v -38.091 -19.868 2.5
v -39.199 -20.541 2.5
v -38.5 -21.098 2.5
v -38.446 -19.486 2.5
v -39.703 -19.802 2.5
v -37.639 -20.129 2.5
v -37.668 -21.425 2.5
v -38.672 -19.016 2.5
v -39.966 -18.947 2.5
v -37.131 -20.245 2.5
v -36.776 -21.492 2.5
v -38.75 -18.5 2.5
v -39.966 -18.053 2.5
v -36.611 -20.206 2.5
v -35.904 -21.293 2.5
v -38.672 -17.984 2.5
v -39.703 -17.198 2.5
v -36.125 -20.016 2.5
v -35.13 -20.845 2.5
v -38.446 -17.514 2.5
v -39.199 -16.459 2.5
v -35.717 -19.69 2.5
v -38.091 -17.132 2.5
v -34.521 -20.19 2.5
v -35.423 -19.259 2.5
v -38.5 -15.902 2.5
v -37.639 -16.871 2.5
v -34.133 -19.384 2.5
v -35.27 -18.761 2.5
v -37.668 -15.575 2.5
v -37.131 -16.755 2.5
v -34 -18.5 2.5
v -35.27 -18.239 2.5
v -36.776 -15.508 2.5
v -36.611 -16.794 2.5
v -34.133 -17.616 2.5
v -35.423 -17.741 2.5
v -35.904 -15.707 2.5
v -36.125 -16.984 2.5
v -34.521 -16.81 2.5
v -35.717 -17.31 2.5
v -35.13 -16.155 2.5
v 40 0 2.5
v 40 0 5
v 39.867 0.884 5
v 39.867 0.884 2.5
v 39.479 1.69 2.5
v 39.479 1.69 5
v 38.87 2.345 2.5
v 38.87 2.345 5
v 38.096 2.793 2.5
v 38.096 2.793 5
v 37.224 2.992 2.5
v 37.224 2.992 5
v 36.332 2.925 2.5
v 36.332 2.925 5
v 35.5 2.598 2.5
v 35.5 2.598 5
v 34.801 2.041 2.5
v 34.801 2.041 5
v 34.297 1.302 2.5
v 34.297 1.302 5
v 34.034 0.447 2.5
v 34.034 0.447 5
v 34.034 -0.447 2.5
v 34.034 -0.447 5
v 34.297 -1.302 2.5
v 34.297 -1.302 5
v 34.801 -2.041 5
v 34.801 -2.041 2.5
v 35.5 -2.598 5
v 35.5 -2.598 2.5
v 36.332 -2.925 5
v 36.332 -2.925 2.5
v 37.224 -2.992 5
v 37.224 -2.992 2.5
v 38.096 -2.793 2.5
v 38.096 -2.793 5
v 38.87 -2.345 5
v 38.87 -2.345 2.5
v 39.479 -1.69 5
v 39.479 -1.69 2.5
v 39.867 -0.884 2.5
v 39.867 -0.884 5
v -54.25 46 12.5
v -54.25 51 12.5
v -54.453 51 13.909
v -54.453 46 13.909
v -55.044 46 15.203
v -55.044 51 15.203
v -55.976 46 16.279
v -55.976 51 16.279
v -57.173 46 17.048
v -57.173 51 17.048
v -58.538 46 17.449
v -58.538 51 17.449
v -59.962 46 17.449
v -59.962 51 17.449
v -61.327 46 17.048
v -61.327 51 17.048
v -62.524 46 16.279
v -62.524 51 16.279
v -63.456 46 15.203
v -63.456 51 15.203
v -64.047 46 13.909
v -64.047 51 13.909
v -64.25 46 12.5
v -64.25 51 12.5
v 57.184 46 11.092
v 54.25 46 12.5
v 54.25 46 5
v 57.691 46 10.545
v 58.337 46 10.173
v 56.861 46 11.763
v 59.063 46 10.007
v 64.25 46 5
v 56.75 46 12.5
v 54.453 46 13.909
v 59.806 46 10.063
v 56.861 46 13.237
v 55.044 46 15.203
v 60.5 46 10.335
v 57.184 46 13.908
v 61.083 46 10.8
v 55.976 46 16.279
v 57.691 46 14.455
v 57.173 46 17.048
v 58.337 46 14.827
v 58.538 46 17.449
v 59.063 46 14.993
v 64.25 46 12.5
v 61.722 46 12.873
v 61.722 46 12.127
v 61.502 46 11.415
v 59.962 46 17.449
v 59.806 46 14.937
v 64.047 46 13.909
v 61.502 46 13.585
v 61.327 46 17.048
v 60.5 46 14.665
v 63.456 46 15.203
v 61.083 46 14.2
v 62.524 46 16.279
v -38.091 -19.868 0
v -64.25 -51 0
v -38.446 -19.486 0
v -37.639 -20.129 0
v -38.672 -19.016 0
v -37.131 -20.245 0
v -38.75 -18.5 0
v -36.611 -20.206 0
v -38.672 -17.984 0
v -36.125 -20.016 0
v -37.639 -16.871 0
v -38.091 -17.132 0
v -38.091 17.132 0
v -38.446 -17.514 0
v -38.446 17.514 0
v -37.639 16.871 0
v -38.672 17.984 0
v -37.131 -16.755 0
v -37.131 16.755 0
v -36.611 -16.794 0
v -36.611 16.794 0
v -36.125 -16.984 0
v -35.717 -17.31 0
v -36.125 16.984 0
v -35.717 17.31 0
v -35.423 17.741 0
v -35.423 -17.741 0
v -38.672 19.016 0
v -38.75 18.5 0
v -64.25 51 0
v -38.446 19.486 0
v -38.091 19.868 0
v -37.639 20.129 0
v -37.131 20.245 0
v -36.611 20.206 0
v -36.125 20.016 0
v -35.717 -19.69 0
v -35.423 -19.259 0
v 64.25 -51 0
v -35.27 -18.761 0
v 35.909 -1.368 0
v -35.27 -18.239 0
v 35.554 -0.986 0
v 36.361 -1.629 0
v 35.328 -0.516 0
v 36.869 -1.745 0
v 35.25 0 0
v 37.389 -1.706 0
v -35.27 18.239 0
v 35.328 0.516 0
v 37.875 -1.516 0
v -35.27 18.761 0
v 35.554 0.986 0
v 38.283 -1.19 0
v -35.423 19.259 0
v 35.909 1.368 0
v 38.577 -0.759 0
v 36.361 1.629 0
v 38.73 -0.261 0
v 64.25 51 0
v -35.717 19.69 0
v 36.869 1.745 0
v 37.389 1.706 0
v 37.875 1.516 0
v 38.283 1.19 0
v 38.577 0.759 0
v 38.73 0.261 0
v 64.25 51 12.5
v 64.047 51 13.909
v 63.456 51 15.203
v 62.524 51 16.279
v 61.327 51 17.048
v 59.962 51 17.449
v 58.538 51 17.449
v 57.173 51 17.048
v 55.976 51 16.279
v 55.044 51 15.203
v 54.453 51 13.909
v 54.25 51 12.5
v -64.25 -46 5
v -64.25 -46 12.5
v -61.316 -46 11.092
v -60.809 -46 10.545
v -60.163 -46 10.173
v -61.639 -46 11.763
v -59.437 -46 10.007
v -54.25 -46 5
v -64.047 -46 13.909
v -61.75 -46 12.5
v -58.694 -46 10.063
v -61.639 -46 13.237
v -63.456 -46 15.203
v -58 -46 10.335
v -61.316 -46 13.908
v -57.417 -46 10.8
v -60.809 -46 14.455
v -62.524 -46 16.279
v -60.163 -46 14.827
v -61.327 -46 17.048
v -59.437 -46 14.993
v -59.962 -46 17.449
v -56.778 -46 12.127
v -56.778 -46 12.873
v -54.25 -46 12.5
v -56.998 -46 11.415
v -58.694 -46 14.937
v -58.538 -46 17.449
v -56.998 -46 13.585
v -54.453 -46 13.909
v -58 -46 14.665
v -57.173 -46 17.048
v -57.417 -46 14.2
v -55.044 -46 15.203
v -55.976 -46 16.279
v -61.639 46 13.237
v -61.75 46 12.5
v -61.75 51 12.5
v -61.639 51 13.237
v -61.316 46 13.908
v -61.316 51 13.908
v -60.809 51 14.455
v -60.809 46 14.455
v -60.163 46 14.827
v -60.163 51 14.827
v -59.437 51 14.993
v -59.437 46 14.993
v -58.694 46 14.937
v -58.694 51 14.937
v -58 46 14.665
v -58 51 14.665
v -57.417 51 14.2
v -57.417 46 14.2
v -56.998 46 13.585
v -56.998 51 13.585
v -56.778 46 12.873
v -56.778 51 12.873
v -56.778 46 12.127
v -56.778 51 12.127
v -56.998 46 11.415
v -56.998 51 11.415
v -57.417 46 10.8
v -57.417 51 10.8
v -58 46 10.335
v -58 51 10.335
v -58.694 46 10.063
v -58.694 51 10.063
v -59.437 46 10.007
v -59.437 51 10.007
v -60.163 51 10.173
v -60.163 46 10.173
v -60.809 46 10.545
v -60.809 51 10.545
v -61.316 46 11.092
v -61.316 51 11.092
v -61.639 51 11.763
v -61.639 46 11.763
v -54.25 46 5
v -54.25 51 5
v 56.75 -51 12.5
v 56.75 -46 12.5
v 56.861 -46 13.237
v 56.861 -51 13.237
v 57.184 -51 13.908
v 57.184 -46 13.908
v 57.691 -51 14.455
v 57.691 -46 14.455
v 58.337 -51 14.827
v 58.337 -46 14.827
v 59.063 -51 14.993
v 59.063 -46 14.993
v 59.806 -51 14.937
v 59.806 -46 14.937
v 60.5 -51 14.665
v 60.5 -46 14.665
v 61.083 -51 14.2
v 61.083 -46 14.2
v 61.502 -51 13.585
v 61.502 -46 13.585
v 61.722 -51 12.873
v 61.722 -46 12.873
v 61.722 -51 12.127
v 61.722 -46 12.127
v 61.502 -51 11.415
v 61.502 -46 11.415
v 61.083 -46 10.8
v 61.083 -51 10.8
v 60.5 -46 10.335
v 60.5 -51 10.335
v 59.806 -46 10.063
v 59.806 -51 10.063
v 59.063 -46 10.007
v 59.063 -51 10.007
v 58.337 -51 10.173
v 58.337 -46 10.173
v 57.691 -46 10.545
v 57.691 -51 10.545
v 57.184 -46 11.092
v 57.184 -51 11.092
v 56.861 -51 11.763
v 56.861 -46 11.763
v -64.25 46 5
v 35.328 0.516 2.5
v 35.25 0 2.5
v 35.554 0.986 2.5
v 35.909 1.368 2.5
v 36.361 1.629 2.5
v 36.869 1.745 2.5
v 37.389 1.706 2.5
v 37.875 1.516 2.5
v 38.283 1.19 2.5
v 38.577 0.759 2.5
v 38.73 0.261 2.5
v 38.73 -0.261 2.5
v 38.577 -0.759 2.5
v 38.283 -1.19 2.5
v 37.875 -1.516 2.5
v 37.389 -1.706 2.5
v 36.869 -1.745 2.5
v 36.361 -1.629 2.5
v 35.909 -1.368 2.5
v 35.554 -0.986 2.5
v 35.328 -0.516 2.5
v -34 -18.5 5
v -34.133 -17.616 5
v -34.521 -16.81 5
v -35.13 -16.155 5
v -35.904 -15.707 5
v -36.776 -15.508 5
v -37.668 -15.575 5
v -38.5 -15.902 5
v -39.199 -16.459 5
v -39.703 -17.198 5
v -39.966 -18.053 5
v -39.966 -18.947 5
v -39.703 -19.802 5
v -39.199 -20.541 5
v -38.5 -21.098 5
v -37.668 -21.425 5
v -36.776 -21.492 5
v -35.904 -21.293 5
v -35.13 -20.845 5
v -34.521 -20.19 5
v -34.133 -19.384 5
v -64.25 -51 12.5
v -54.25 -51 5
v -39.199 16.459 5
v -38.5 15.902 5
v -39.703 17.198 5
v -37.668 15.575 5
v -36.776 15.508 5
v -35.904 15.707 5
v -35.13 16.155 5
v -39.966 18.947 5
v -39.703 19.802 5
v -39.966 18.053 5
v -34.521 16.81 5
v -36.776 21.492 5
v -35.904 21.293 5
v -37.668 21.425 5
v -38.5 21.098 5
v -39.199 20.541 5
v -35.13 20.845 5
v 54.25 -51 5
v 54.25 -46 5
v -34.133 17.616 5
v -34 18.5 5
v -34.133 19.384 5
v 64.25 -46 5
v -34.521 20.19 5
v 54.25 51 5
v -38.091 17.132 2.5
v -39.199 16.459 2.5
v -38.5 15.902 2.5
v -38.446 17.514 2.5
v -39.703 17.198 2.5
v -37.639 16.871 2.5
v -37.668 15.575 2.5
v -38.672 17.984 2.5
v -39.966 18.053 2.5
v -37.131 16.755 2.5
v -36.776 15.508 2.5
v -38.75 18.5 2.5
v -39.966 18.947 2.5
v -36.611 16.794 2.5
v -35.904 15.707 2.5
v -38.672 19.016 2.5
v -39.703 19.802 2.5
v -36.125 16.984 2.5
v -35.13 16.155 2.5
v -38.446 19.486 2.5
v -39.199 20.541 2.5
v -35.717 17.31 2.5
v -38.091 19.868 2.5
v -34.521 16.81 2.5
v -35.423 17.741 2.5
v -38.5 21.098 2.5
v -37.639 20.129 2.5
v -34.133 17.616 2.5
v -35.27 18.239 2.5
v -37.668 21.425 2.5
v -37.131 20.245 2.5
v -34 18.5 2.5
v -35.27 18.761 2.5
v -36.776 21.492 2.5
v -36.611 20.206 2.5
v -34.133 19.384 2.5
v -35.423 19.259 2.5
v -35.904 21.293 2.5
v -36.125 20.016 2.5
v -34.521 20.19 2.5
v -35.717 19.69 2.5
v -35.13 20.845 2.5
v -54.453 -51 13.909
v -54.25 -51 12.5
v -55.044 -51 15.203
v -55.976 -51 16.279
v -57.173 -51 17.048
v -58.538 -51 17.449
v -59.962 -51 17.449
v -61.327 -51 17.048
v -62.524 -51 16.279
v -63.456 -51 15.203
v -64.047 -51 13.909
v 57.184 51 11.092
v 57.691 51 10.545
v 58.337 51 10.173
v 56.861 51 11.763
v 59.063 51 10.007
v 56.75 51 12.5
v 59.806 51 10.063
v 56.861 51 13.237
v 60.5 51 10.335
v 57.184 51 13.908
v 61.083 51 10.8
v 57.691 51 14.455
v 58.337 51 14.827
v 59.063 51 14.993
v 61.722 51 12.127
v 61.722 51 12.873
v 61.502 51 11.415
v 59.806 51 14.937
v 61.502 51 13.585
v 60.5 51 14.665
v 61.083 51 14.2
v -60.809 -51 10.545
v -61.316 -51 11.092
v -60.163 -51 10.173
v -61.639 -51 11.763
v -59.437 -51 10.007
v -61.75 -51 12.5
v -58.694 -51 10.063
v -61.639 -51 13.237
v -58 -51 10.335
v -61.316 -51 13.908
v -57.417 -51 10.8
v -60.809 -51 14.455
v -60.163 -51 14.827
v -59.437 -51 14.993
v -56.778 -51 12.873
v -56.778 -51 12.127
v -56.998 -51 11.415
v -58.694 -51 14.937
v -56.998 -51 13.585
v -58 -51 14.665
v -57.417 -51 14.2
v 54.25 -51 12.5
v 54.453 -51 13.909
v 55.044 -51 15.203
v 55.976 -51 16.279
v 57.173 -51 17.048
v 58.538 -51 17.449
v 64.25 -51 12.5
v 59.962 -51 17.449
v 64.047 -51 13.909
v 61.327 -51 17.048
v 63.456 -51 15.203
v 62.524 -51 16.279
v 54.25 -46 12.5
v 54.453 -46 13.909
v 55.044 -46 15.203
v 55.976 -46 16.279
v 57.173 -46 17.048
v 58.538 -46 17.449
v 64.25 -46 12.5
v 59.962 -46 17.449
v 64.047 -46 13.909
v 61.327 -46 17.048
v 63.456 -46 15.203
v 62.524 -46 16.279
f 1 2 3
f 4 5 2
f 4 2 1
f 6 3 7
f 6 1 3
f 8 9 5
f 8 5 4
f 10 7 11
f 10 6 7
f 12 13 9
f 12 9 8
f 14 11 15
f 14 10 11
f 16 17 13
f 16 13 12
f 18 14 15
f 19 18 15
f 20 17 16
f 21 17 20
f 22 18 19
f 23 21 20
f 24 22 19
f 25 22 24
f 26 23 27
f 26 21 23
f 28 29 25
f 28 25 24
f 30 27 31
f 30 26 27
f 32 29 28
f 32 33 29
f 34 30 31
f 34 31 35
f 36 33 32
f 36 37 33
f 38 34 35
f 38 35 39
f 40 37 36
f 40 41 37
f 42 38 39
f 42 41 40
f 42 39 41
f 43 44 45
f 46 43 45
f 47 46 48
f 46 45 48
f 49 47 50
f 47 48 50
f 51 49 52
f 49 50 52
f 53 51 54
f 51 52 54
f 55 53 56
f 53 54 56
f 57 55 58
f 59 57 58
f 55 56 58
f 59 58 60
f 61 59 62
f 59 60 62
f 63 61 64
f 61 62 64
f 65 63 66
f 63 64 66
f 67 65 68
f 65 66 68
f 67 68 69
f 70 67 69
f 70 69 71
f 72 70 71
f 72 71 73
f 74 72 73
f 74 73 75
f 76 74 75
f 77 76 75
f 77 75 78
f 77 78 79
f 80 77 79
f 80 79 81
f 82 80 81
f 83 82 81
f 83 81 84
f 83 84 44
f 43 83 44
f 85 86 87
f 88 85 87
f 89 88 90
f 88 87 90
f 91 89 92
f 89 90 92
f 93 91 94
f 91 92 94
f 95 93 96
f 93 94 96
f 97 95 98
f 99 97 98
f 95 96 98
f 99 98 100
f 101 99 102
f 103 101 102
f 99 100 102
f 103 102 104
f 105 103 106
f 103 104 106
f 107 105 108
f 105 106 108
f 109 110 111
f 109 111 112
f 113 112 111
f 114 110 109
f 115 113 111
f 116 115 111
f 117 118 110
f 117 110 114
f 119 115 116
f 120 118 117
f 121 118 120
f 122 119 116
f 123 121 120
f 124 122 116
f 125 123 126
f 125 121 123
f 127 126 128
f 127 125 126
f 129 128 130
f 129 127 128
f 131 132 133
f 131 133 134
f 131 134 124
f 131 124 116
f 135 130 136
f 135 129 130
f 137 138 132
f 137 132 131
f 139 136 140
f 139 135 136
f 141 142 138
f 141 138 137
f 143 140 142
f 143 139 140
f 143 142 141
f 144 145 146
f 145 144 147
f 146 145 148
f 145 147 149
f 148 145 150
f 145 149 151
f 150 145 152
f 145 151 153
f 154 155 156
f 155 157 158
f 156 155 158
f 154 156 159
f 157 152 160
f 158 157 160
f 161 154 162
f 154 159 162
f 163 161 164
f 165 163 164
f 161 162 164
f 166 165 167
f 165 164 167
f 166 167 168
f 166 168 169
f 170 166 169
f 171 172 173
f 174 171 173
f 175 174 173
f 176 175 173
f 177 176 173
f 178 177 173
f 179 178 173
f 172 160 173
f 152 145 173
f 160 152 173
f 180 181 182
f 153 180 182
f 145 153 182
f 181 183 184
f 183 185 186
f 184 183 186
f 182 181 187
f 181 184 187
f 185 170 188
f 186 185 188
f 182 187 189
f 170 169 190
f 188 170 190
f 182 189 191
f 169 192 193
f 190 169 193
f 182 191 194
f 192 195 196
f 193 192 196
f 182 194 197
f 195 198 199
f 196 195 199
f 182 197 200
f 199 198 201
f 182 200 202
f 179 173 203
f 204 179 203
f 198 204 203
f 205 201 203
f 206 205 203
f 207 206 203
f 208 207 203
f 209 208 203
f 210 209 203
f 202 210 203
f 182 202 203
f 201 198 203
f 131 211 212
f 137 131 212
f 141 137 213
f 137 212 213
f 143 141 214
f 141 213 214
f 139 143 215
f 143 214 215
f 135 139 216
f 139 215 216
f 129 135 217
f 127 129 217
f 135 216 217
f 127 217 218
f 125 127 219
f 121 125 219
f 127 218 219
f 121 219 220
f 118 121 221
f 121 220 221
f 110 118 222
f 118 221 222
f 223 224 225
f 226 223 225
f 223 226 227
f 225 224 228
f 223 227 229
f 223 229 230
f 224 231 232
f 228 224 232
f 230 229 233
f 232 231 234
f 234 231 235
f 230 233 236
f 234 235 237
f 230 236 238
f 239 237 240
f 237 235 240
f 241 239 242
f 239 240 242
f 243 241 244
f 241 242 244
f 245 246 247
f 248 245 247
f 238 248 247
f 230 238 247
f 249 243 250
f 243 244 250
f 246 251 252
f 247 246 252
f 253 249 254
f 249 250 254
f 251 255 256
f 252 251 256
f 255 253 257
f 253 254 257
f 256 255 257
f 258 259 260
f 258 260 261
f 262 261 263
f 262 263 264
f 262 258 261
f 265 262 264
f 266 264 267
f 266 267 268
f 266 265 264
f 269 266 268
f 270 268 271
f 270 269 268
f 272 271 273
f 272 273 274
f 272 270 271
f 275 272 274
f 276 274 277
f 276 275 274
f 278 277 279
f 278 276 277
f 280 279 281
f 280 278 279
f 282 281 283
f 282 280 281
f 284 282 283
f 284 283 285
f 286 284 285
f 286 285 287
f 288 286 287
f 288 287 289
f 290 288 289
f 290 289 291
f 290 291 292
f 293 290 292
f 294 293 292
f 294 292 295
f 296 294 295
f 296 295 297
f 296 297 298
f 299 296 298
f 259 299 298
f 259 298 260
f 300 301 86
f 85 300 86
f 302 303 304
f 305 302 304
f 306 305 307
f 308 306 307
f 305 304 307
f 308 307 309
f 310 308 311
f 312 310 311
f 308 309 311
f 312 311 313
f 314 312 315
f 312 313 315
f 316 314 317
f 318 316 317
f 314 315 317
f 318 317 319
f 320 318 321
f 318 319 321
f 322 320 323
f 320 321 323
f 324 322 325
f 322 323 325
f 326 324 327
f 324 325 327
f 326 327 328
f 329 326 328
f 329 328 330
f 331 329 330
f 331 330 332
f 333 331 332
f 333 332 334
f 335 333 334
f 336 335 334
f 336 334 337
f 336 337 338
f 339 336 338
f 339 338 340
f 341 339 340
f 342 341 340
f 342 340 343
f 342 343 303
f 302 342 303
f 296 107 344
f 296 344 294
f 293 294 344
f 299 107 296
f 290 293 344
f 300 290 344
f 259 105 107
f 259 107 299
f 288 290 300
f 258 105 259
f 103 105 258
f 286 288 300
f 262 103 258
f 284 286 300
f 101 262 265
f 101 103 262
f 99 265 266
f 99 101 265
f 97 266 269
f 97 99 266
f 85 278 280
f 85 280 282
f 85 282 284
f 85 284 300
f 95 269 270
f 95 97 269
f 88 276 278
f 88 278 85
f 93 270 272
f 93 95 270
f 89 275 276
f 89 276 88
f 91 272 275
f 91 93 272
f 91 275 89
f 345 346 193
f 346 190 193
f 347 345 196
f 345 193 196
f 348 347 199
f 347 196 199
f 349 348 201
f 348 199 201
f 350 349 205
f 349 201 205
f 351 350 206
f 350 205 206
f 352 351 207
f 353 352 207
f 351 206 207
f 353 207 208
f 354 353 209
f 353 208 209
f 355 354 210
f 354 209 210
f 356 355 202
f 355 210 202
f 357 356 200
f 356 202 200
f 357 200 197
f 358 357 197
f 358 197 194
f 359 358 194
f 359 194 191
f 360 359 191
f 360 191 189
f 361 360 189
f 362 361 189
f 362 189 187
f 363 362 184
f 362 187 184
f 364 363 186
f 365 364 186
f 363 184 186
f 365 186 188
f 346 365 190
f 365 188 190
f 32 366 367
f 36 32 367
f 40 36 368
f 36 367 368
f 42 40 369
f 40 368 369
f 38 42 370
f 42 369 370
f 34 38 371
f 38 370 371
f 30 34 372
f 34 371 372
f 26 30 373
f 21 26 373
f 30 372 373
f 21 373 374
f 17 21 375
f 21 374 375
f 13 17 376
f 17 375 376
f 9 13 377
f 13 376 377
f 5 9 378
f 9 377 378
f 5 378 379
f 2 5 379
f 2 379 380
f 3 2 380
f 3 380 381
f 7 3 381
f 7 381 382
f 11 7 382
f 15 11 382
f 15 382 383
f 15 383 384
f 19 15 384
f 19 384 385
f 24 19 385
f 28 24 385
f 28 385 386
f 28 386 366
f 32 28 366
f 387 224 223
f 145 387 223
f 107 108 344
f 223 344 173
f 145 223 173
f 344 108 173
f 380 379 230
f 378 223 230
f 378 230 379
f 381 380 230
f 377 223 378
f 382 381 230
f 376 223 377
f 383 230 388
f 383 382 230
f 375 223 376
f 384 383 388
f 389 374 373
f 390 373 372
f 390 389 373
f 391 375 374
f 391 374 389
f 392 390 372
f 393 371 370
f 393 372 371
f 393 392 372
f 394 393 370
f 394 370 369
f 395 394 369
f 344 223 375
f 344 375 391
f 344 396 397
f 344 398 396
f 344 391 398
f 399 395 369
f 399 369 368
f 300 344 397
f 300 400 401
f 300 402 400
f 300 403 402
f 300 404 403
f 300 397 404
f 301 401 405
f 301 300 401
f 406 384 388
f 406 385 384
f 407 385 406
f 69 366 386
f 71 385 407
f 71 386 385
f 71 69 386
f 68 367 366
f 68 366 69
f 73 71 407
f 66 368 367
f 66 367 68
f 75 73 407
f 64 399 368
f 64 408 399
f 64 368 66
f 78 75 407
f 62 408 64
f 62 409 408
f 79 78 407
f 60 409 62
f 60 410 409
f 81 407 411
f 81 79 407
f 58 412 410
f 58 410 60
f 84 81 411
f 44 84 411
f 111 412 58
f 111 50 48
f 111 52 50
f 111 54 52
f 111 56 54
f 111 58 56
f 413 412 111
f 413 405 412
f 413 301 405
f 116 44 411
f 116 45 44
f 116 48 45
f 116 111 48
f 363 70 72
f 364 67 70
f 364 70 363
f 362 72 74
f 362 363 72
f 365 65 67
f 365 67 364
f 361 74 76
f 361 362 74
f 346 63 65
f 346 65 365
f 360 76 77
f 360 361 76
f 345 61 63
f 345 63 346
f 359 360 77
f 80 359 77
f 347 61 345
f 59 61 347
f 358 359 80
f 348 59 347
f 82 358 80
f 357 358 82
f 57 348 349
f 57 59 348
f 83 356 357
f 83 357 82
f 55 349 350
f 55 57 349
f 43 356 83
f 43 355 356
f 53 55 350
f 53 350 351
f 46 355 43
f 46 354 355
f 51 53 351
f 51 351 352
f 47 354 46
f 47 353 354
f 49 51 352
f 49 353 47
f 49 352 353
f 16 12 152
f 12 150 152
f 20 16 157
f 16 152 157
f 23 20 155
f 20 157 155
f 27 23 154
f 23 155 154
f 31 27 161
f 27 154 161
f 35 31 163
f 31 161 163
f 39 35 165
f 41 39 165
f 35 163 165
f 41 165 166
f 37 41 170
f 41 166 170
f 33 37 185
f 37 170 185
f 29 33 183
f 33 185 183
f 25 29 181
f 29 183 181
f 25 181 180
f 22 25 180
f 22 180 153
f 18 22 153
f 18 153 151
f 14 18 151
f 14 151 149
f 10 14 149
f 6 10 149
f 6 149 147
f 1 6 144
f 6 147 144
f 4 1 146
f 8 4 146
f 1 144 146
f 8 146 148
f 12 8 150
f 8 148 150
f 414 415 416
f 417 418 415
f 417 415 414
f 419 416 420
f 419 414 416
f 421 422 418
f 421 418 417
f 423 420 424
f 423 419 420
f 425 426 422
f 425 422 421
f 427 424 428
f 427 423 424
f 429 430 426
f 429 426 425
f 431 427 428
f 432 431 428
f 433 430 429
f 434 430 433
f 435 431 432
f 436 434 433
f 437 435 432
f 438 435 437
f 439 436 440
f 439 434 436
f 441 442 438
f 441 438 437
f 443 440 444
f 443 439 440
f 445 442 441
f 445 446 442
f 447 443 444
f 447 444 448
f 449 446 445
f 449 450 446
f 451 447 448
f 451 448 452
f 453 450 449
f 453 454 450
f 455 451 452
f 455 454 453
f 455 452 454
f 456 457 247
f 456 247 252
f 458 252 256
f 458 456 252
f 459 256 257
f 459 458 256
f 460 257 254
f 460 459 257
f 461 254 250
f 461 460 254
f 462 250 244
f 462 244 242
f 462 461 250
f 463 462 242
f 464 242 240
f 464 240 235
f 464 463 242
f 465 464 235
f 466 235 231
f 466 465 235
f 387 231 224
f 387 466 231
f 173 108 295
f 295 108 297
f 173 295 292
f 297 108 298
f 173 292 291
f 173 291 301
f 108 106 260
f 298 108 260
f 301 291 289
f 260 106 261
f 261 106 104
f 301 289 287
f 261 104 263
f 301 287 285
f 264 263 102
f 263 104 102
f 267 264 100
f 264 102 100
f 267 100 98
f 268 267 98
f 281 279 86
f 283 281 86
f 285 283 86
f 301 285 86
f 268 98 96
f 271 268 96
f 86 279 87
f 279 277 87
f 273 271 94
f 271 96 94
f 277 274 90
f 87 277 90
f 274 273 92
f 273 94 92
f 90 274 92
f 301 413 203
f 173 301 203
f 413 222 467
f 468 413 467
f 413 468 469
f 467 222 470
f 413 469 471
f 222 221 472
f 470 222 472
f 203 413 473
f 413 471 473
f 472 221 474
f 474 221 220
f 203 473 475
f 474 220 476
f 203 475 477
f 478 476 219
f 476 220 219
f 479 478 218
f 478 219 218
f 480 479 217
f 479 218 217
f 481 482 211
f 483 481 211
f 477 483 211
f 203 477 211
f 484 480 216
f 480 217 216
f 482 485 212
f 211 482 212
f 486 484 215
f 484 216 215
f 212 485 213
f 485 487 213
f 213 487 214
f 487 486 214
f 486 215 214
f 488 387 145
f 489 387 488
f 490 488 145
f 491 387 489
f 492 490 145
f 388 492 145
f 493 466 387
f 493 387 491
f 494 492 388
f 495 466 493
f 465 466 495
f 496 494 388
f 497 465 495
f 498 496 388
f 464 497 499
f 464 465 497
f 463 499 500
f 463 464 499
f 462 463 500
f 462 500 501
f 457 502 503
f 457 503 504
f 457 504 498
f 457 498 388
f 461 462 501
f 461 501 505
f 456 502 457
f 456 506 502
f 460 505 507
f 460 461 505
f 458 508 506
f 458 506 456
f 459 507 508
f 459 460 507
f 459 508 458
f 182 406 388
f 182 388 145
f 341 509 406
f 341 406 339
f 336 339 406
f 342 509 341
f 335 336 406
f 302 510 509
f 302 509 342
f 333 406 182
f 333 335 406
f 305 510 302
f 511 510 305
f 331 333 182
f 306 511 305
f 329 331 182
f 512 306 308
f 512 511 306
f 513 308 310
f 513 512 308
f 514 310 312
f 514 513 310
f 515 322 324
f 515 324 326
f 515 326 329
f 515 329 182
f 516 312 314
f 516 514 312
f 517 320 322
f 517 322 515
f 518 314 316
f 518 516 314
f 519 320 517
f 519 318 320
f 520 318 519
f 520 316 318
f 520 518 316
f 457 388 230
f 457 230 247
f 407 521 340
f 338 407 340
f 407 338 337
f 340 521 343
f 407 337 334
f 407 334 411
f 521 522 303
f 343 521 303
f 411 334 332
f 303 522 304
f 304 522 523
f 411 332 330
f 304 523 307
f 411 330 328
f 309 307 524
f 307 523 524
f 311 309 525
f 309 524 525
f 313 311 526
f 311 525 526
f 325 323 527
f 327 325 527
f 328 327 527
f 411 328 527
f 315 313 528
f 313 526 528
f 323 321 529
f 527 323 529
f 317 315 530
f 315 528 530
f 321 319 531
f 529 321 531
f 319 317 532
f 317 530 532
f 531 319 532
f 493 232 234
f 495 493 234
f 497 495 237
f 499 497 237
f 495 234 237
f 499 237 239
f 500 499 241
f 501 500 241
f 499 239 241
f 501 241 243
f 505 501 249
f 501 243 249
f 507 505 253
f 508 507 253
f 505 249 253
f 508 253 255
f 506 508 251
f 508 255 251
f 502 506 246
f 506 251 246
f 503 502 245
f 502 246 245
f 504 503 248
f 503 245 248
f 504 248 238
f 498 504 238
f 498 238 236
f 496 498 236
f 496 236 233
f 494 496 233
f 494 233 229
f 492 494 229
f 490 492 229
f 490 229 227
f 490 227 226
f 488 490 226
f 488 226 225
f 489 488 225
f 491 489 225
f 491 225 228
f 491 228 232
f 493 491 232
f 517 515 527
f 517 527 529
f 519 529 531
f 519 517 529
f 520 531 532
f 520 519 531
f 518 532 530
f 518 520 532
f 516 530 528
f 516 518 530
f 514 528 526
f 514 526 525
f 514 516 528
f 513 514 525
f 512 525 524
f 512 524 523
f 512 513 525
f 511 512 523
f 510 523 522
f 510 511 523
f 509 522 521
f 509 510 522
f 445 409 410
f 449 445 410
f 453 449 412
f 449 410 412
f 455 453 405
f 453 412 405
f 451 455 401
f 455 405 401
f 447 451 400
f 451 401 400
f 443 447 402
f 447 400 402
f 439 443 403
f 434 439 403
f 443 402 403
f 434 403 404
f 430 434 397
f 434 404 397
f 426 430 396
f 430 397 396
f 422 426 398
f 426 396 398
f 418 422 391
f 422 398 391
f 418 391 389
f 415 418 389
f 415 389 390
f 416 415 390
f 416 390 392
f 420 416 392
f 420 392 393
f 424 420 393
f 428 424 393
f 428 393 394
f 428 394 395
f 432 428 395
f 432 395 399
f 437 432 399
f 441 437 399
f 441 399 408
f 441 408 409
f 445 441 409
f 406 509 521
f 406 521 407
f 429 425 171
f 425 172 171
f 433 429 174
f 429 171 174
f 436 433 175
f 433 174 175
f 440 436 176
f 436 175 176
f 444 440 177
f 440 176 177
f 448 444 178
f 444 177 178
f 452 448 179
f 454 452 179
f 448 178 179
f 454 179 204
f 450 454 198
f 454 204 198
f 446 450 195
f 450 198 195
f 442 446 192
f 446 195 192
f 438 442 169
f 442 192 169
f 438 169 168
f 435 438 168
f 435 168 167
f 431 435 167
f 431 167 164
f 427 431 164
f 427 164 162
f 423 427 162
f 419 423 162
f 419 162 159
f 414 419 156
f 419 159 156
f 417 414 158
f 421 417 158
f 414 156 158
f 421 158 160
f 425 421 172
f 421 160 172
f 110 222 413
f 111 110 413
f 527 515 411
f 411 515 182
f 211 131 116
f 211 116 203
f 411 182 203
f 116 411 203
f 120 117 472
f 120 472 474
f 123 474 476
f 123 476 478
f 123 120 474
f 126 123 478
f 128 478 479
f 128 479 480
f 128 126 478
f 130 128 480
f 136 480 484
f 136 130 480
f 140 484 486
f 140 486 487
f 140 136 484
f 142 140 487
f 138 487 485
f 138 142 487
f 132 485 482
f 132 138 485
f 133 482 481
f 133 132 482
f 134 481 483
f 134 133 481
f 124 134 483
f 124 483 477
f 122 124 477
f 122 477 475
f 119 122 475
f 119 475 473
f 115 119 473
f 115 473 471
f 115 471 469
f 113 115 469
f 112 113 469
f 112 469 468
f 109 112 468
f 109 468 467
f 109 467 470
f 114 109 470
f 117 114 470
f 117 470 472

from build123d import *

# Parameters (mm, degrees)
F0_W           = 128.5
F0_H           = 102
F1_DEPTH       = 5
F3_DEPTH       = 5
F5_D           = 5
F8_D           = 3.5
F8_CBORE_D     = 6
F8_CBORE_DEPTH = 2.5


with BuildPart() as f1:
    # F0 (on Top) → F1 (new body)
    with BuildSketch(Plane.XY):
        Rectangle(F0_W, F0_H)
    extrude(amount=F1_DEPTH)

    # F2 (on face) → F3 (join)
    with BuildSketch(Plane.XZ.offset(51)):
        with BuildLine():
            Line((-64.25, 12.5), (-64.25, 5))
            Line((-64.25, 5), (-54.25, 5))
            Line((-54.25, 5), (-54.25, 12.5))
            ThreePointArc((-54.25, 12.5), (-59.25, 17.5), (-64.25, 12.5))
        make_face()
        with BuildLine():
            Line((54.25, 12.5), (54.25, 5))
            Line((54.25, 5), (64.25, 5))
            Line((64.25, 5), (64.25, 12.5))
            ThreePointArc((64.25, 12.5), (59.25, 17.5), (54.25, 12.5))
        make_face()
    extrude(amount=-F3_DEPTH)

    # F5 (through all)
    with Locations(Plane.XZ.offset(51)):
        with Locations((-59.25, 12.5), (59.25, 12.5)):
            Hole(F5_D / 2)

    # F6: F1 across plane


with BuildPart() as f1_1:
    add(f1.part)
    add(f1.part.mirror(Plane.XZ))

    # F8 (through all)
    with Locations(Plane.XY.offset(5)):
        with Locations((-37, 18.5), (-37, -18.5), (37, 0)):
            CounterBoreHole(F8_D / 2, F8_CBORE_D / 2, F8_CBORE_DEPTH)


solid = f1_1.part
